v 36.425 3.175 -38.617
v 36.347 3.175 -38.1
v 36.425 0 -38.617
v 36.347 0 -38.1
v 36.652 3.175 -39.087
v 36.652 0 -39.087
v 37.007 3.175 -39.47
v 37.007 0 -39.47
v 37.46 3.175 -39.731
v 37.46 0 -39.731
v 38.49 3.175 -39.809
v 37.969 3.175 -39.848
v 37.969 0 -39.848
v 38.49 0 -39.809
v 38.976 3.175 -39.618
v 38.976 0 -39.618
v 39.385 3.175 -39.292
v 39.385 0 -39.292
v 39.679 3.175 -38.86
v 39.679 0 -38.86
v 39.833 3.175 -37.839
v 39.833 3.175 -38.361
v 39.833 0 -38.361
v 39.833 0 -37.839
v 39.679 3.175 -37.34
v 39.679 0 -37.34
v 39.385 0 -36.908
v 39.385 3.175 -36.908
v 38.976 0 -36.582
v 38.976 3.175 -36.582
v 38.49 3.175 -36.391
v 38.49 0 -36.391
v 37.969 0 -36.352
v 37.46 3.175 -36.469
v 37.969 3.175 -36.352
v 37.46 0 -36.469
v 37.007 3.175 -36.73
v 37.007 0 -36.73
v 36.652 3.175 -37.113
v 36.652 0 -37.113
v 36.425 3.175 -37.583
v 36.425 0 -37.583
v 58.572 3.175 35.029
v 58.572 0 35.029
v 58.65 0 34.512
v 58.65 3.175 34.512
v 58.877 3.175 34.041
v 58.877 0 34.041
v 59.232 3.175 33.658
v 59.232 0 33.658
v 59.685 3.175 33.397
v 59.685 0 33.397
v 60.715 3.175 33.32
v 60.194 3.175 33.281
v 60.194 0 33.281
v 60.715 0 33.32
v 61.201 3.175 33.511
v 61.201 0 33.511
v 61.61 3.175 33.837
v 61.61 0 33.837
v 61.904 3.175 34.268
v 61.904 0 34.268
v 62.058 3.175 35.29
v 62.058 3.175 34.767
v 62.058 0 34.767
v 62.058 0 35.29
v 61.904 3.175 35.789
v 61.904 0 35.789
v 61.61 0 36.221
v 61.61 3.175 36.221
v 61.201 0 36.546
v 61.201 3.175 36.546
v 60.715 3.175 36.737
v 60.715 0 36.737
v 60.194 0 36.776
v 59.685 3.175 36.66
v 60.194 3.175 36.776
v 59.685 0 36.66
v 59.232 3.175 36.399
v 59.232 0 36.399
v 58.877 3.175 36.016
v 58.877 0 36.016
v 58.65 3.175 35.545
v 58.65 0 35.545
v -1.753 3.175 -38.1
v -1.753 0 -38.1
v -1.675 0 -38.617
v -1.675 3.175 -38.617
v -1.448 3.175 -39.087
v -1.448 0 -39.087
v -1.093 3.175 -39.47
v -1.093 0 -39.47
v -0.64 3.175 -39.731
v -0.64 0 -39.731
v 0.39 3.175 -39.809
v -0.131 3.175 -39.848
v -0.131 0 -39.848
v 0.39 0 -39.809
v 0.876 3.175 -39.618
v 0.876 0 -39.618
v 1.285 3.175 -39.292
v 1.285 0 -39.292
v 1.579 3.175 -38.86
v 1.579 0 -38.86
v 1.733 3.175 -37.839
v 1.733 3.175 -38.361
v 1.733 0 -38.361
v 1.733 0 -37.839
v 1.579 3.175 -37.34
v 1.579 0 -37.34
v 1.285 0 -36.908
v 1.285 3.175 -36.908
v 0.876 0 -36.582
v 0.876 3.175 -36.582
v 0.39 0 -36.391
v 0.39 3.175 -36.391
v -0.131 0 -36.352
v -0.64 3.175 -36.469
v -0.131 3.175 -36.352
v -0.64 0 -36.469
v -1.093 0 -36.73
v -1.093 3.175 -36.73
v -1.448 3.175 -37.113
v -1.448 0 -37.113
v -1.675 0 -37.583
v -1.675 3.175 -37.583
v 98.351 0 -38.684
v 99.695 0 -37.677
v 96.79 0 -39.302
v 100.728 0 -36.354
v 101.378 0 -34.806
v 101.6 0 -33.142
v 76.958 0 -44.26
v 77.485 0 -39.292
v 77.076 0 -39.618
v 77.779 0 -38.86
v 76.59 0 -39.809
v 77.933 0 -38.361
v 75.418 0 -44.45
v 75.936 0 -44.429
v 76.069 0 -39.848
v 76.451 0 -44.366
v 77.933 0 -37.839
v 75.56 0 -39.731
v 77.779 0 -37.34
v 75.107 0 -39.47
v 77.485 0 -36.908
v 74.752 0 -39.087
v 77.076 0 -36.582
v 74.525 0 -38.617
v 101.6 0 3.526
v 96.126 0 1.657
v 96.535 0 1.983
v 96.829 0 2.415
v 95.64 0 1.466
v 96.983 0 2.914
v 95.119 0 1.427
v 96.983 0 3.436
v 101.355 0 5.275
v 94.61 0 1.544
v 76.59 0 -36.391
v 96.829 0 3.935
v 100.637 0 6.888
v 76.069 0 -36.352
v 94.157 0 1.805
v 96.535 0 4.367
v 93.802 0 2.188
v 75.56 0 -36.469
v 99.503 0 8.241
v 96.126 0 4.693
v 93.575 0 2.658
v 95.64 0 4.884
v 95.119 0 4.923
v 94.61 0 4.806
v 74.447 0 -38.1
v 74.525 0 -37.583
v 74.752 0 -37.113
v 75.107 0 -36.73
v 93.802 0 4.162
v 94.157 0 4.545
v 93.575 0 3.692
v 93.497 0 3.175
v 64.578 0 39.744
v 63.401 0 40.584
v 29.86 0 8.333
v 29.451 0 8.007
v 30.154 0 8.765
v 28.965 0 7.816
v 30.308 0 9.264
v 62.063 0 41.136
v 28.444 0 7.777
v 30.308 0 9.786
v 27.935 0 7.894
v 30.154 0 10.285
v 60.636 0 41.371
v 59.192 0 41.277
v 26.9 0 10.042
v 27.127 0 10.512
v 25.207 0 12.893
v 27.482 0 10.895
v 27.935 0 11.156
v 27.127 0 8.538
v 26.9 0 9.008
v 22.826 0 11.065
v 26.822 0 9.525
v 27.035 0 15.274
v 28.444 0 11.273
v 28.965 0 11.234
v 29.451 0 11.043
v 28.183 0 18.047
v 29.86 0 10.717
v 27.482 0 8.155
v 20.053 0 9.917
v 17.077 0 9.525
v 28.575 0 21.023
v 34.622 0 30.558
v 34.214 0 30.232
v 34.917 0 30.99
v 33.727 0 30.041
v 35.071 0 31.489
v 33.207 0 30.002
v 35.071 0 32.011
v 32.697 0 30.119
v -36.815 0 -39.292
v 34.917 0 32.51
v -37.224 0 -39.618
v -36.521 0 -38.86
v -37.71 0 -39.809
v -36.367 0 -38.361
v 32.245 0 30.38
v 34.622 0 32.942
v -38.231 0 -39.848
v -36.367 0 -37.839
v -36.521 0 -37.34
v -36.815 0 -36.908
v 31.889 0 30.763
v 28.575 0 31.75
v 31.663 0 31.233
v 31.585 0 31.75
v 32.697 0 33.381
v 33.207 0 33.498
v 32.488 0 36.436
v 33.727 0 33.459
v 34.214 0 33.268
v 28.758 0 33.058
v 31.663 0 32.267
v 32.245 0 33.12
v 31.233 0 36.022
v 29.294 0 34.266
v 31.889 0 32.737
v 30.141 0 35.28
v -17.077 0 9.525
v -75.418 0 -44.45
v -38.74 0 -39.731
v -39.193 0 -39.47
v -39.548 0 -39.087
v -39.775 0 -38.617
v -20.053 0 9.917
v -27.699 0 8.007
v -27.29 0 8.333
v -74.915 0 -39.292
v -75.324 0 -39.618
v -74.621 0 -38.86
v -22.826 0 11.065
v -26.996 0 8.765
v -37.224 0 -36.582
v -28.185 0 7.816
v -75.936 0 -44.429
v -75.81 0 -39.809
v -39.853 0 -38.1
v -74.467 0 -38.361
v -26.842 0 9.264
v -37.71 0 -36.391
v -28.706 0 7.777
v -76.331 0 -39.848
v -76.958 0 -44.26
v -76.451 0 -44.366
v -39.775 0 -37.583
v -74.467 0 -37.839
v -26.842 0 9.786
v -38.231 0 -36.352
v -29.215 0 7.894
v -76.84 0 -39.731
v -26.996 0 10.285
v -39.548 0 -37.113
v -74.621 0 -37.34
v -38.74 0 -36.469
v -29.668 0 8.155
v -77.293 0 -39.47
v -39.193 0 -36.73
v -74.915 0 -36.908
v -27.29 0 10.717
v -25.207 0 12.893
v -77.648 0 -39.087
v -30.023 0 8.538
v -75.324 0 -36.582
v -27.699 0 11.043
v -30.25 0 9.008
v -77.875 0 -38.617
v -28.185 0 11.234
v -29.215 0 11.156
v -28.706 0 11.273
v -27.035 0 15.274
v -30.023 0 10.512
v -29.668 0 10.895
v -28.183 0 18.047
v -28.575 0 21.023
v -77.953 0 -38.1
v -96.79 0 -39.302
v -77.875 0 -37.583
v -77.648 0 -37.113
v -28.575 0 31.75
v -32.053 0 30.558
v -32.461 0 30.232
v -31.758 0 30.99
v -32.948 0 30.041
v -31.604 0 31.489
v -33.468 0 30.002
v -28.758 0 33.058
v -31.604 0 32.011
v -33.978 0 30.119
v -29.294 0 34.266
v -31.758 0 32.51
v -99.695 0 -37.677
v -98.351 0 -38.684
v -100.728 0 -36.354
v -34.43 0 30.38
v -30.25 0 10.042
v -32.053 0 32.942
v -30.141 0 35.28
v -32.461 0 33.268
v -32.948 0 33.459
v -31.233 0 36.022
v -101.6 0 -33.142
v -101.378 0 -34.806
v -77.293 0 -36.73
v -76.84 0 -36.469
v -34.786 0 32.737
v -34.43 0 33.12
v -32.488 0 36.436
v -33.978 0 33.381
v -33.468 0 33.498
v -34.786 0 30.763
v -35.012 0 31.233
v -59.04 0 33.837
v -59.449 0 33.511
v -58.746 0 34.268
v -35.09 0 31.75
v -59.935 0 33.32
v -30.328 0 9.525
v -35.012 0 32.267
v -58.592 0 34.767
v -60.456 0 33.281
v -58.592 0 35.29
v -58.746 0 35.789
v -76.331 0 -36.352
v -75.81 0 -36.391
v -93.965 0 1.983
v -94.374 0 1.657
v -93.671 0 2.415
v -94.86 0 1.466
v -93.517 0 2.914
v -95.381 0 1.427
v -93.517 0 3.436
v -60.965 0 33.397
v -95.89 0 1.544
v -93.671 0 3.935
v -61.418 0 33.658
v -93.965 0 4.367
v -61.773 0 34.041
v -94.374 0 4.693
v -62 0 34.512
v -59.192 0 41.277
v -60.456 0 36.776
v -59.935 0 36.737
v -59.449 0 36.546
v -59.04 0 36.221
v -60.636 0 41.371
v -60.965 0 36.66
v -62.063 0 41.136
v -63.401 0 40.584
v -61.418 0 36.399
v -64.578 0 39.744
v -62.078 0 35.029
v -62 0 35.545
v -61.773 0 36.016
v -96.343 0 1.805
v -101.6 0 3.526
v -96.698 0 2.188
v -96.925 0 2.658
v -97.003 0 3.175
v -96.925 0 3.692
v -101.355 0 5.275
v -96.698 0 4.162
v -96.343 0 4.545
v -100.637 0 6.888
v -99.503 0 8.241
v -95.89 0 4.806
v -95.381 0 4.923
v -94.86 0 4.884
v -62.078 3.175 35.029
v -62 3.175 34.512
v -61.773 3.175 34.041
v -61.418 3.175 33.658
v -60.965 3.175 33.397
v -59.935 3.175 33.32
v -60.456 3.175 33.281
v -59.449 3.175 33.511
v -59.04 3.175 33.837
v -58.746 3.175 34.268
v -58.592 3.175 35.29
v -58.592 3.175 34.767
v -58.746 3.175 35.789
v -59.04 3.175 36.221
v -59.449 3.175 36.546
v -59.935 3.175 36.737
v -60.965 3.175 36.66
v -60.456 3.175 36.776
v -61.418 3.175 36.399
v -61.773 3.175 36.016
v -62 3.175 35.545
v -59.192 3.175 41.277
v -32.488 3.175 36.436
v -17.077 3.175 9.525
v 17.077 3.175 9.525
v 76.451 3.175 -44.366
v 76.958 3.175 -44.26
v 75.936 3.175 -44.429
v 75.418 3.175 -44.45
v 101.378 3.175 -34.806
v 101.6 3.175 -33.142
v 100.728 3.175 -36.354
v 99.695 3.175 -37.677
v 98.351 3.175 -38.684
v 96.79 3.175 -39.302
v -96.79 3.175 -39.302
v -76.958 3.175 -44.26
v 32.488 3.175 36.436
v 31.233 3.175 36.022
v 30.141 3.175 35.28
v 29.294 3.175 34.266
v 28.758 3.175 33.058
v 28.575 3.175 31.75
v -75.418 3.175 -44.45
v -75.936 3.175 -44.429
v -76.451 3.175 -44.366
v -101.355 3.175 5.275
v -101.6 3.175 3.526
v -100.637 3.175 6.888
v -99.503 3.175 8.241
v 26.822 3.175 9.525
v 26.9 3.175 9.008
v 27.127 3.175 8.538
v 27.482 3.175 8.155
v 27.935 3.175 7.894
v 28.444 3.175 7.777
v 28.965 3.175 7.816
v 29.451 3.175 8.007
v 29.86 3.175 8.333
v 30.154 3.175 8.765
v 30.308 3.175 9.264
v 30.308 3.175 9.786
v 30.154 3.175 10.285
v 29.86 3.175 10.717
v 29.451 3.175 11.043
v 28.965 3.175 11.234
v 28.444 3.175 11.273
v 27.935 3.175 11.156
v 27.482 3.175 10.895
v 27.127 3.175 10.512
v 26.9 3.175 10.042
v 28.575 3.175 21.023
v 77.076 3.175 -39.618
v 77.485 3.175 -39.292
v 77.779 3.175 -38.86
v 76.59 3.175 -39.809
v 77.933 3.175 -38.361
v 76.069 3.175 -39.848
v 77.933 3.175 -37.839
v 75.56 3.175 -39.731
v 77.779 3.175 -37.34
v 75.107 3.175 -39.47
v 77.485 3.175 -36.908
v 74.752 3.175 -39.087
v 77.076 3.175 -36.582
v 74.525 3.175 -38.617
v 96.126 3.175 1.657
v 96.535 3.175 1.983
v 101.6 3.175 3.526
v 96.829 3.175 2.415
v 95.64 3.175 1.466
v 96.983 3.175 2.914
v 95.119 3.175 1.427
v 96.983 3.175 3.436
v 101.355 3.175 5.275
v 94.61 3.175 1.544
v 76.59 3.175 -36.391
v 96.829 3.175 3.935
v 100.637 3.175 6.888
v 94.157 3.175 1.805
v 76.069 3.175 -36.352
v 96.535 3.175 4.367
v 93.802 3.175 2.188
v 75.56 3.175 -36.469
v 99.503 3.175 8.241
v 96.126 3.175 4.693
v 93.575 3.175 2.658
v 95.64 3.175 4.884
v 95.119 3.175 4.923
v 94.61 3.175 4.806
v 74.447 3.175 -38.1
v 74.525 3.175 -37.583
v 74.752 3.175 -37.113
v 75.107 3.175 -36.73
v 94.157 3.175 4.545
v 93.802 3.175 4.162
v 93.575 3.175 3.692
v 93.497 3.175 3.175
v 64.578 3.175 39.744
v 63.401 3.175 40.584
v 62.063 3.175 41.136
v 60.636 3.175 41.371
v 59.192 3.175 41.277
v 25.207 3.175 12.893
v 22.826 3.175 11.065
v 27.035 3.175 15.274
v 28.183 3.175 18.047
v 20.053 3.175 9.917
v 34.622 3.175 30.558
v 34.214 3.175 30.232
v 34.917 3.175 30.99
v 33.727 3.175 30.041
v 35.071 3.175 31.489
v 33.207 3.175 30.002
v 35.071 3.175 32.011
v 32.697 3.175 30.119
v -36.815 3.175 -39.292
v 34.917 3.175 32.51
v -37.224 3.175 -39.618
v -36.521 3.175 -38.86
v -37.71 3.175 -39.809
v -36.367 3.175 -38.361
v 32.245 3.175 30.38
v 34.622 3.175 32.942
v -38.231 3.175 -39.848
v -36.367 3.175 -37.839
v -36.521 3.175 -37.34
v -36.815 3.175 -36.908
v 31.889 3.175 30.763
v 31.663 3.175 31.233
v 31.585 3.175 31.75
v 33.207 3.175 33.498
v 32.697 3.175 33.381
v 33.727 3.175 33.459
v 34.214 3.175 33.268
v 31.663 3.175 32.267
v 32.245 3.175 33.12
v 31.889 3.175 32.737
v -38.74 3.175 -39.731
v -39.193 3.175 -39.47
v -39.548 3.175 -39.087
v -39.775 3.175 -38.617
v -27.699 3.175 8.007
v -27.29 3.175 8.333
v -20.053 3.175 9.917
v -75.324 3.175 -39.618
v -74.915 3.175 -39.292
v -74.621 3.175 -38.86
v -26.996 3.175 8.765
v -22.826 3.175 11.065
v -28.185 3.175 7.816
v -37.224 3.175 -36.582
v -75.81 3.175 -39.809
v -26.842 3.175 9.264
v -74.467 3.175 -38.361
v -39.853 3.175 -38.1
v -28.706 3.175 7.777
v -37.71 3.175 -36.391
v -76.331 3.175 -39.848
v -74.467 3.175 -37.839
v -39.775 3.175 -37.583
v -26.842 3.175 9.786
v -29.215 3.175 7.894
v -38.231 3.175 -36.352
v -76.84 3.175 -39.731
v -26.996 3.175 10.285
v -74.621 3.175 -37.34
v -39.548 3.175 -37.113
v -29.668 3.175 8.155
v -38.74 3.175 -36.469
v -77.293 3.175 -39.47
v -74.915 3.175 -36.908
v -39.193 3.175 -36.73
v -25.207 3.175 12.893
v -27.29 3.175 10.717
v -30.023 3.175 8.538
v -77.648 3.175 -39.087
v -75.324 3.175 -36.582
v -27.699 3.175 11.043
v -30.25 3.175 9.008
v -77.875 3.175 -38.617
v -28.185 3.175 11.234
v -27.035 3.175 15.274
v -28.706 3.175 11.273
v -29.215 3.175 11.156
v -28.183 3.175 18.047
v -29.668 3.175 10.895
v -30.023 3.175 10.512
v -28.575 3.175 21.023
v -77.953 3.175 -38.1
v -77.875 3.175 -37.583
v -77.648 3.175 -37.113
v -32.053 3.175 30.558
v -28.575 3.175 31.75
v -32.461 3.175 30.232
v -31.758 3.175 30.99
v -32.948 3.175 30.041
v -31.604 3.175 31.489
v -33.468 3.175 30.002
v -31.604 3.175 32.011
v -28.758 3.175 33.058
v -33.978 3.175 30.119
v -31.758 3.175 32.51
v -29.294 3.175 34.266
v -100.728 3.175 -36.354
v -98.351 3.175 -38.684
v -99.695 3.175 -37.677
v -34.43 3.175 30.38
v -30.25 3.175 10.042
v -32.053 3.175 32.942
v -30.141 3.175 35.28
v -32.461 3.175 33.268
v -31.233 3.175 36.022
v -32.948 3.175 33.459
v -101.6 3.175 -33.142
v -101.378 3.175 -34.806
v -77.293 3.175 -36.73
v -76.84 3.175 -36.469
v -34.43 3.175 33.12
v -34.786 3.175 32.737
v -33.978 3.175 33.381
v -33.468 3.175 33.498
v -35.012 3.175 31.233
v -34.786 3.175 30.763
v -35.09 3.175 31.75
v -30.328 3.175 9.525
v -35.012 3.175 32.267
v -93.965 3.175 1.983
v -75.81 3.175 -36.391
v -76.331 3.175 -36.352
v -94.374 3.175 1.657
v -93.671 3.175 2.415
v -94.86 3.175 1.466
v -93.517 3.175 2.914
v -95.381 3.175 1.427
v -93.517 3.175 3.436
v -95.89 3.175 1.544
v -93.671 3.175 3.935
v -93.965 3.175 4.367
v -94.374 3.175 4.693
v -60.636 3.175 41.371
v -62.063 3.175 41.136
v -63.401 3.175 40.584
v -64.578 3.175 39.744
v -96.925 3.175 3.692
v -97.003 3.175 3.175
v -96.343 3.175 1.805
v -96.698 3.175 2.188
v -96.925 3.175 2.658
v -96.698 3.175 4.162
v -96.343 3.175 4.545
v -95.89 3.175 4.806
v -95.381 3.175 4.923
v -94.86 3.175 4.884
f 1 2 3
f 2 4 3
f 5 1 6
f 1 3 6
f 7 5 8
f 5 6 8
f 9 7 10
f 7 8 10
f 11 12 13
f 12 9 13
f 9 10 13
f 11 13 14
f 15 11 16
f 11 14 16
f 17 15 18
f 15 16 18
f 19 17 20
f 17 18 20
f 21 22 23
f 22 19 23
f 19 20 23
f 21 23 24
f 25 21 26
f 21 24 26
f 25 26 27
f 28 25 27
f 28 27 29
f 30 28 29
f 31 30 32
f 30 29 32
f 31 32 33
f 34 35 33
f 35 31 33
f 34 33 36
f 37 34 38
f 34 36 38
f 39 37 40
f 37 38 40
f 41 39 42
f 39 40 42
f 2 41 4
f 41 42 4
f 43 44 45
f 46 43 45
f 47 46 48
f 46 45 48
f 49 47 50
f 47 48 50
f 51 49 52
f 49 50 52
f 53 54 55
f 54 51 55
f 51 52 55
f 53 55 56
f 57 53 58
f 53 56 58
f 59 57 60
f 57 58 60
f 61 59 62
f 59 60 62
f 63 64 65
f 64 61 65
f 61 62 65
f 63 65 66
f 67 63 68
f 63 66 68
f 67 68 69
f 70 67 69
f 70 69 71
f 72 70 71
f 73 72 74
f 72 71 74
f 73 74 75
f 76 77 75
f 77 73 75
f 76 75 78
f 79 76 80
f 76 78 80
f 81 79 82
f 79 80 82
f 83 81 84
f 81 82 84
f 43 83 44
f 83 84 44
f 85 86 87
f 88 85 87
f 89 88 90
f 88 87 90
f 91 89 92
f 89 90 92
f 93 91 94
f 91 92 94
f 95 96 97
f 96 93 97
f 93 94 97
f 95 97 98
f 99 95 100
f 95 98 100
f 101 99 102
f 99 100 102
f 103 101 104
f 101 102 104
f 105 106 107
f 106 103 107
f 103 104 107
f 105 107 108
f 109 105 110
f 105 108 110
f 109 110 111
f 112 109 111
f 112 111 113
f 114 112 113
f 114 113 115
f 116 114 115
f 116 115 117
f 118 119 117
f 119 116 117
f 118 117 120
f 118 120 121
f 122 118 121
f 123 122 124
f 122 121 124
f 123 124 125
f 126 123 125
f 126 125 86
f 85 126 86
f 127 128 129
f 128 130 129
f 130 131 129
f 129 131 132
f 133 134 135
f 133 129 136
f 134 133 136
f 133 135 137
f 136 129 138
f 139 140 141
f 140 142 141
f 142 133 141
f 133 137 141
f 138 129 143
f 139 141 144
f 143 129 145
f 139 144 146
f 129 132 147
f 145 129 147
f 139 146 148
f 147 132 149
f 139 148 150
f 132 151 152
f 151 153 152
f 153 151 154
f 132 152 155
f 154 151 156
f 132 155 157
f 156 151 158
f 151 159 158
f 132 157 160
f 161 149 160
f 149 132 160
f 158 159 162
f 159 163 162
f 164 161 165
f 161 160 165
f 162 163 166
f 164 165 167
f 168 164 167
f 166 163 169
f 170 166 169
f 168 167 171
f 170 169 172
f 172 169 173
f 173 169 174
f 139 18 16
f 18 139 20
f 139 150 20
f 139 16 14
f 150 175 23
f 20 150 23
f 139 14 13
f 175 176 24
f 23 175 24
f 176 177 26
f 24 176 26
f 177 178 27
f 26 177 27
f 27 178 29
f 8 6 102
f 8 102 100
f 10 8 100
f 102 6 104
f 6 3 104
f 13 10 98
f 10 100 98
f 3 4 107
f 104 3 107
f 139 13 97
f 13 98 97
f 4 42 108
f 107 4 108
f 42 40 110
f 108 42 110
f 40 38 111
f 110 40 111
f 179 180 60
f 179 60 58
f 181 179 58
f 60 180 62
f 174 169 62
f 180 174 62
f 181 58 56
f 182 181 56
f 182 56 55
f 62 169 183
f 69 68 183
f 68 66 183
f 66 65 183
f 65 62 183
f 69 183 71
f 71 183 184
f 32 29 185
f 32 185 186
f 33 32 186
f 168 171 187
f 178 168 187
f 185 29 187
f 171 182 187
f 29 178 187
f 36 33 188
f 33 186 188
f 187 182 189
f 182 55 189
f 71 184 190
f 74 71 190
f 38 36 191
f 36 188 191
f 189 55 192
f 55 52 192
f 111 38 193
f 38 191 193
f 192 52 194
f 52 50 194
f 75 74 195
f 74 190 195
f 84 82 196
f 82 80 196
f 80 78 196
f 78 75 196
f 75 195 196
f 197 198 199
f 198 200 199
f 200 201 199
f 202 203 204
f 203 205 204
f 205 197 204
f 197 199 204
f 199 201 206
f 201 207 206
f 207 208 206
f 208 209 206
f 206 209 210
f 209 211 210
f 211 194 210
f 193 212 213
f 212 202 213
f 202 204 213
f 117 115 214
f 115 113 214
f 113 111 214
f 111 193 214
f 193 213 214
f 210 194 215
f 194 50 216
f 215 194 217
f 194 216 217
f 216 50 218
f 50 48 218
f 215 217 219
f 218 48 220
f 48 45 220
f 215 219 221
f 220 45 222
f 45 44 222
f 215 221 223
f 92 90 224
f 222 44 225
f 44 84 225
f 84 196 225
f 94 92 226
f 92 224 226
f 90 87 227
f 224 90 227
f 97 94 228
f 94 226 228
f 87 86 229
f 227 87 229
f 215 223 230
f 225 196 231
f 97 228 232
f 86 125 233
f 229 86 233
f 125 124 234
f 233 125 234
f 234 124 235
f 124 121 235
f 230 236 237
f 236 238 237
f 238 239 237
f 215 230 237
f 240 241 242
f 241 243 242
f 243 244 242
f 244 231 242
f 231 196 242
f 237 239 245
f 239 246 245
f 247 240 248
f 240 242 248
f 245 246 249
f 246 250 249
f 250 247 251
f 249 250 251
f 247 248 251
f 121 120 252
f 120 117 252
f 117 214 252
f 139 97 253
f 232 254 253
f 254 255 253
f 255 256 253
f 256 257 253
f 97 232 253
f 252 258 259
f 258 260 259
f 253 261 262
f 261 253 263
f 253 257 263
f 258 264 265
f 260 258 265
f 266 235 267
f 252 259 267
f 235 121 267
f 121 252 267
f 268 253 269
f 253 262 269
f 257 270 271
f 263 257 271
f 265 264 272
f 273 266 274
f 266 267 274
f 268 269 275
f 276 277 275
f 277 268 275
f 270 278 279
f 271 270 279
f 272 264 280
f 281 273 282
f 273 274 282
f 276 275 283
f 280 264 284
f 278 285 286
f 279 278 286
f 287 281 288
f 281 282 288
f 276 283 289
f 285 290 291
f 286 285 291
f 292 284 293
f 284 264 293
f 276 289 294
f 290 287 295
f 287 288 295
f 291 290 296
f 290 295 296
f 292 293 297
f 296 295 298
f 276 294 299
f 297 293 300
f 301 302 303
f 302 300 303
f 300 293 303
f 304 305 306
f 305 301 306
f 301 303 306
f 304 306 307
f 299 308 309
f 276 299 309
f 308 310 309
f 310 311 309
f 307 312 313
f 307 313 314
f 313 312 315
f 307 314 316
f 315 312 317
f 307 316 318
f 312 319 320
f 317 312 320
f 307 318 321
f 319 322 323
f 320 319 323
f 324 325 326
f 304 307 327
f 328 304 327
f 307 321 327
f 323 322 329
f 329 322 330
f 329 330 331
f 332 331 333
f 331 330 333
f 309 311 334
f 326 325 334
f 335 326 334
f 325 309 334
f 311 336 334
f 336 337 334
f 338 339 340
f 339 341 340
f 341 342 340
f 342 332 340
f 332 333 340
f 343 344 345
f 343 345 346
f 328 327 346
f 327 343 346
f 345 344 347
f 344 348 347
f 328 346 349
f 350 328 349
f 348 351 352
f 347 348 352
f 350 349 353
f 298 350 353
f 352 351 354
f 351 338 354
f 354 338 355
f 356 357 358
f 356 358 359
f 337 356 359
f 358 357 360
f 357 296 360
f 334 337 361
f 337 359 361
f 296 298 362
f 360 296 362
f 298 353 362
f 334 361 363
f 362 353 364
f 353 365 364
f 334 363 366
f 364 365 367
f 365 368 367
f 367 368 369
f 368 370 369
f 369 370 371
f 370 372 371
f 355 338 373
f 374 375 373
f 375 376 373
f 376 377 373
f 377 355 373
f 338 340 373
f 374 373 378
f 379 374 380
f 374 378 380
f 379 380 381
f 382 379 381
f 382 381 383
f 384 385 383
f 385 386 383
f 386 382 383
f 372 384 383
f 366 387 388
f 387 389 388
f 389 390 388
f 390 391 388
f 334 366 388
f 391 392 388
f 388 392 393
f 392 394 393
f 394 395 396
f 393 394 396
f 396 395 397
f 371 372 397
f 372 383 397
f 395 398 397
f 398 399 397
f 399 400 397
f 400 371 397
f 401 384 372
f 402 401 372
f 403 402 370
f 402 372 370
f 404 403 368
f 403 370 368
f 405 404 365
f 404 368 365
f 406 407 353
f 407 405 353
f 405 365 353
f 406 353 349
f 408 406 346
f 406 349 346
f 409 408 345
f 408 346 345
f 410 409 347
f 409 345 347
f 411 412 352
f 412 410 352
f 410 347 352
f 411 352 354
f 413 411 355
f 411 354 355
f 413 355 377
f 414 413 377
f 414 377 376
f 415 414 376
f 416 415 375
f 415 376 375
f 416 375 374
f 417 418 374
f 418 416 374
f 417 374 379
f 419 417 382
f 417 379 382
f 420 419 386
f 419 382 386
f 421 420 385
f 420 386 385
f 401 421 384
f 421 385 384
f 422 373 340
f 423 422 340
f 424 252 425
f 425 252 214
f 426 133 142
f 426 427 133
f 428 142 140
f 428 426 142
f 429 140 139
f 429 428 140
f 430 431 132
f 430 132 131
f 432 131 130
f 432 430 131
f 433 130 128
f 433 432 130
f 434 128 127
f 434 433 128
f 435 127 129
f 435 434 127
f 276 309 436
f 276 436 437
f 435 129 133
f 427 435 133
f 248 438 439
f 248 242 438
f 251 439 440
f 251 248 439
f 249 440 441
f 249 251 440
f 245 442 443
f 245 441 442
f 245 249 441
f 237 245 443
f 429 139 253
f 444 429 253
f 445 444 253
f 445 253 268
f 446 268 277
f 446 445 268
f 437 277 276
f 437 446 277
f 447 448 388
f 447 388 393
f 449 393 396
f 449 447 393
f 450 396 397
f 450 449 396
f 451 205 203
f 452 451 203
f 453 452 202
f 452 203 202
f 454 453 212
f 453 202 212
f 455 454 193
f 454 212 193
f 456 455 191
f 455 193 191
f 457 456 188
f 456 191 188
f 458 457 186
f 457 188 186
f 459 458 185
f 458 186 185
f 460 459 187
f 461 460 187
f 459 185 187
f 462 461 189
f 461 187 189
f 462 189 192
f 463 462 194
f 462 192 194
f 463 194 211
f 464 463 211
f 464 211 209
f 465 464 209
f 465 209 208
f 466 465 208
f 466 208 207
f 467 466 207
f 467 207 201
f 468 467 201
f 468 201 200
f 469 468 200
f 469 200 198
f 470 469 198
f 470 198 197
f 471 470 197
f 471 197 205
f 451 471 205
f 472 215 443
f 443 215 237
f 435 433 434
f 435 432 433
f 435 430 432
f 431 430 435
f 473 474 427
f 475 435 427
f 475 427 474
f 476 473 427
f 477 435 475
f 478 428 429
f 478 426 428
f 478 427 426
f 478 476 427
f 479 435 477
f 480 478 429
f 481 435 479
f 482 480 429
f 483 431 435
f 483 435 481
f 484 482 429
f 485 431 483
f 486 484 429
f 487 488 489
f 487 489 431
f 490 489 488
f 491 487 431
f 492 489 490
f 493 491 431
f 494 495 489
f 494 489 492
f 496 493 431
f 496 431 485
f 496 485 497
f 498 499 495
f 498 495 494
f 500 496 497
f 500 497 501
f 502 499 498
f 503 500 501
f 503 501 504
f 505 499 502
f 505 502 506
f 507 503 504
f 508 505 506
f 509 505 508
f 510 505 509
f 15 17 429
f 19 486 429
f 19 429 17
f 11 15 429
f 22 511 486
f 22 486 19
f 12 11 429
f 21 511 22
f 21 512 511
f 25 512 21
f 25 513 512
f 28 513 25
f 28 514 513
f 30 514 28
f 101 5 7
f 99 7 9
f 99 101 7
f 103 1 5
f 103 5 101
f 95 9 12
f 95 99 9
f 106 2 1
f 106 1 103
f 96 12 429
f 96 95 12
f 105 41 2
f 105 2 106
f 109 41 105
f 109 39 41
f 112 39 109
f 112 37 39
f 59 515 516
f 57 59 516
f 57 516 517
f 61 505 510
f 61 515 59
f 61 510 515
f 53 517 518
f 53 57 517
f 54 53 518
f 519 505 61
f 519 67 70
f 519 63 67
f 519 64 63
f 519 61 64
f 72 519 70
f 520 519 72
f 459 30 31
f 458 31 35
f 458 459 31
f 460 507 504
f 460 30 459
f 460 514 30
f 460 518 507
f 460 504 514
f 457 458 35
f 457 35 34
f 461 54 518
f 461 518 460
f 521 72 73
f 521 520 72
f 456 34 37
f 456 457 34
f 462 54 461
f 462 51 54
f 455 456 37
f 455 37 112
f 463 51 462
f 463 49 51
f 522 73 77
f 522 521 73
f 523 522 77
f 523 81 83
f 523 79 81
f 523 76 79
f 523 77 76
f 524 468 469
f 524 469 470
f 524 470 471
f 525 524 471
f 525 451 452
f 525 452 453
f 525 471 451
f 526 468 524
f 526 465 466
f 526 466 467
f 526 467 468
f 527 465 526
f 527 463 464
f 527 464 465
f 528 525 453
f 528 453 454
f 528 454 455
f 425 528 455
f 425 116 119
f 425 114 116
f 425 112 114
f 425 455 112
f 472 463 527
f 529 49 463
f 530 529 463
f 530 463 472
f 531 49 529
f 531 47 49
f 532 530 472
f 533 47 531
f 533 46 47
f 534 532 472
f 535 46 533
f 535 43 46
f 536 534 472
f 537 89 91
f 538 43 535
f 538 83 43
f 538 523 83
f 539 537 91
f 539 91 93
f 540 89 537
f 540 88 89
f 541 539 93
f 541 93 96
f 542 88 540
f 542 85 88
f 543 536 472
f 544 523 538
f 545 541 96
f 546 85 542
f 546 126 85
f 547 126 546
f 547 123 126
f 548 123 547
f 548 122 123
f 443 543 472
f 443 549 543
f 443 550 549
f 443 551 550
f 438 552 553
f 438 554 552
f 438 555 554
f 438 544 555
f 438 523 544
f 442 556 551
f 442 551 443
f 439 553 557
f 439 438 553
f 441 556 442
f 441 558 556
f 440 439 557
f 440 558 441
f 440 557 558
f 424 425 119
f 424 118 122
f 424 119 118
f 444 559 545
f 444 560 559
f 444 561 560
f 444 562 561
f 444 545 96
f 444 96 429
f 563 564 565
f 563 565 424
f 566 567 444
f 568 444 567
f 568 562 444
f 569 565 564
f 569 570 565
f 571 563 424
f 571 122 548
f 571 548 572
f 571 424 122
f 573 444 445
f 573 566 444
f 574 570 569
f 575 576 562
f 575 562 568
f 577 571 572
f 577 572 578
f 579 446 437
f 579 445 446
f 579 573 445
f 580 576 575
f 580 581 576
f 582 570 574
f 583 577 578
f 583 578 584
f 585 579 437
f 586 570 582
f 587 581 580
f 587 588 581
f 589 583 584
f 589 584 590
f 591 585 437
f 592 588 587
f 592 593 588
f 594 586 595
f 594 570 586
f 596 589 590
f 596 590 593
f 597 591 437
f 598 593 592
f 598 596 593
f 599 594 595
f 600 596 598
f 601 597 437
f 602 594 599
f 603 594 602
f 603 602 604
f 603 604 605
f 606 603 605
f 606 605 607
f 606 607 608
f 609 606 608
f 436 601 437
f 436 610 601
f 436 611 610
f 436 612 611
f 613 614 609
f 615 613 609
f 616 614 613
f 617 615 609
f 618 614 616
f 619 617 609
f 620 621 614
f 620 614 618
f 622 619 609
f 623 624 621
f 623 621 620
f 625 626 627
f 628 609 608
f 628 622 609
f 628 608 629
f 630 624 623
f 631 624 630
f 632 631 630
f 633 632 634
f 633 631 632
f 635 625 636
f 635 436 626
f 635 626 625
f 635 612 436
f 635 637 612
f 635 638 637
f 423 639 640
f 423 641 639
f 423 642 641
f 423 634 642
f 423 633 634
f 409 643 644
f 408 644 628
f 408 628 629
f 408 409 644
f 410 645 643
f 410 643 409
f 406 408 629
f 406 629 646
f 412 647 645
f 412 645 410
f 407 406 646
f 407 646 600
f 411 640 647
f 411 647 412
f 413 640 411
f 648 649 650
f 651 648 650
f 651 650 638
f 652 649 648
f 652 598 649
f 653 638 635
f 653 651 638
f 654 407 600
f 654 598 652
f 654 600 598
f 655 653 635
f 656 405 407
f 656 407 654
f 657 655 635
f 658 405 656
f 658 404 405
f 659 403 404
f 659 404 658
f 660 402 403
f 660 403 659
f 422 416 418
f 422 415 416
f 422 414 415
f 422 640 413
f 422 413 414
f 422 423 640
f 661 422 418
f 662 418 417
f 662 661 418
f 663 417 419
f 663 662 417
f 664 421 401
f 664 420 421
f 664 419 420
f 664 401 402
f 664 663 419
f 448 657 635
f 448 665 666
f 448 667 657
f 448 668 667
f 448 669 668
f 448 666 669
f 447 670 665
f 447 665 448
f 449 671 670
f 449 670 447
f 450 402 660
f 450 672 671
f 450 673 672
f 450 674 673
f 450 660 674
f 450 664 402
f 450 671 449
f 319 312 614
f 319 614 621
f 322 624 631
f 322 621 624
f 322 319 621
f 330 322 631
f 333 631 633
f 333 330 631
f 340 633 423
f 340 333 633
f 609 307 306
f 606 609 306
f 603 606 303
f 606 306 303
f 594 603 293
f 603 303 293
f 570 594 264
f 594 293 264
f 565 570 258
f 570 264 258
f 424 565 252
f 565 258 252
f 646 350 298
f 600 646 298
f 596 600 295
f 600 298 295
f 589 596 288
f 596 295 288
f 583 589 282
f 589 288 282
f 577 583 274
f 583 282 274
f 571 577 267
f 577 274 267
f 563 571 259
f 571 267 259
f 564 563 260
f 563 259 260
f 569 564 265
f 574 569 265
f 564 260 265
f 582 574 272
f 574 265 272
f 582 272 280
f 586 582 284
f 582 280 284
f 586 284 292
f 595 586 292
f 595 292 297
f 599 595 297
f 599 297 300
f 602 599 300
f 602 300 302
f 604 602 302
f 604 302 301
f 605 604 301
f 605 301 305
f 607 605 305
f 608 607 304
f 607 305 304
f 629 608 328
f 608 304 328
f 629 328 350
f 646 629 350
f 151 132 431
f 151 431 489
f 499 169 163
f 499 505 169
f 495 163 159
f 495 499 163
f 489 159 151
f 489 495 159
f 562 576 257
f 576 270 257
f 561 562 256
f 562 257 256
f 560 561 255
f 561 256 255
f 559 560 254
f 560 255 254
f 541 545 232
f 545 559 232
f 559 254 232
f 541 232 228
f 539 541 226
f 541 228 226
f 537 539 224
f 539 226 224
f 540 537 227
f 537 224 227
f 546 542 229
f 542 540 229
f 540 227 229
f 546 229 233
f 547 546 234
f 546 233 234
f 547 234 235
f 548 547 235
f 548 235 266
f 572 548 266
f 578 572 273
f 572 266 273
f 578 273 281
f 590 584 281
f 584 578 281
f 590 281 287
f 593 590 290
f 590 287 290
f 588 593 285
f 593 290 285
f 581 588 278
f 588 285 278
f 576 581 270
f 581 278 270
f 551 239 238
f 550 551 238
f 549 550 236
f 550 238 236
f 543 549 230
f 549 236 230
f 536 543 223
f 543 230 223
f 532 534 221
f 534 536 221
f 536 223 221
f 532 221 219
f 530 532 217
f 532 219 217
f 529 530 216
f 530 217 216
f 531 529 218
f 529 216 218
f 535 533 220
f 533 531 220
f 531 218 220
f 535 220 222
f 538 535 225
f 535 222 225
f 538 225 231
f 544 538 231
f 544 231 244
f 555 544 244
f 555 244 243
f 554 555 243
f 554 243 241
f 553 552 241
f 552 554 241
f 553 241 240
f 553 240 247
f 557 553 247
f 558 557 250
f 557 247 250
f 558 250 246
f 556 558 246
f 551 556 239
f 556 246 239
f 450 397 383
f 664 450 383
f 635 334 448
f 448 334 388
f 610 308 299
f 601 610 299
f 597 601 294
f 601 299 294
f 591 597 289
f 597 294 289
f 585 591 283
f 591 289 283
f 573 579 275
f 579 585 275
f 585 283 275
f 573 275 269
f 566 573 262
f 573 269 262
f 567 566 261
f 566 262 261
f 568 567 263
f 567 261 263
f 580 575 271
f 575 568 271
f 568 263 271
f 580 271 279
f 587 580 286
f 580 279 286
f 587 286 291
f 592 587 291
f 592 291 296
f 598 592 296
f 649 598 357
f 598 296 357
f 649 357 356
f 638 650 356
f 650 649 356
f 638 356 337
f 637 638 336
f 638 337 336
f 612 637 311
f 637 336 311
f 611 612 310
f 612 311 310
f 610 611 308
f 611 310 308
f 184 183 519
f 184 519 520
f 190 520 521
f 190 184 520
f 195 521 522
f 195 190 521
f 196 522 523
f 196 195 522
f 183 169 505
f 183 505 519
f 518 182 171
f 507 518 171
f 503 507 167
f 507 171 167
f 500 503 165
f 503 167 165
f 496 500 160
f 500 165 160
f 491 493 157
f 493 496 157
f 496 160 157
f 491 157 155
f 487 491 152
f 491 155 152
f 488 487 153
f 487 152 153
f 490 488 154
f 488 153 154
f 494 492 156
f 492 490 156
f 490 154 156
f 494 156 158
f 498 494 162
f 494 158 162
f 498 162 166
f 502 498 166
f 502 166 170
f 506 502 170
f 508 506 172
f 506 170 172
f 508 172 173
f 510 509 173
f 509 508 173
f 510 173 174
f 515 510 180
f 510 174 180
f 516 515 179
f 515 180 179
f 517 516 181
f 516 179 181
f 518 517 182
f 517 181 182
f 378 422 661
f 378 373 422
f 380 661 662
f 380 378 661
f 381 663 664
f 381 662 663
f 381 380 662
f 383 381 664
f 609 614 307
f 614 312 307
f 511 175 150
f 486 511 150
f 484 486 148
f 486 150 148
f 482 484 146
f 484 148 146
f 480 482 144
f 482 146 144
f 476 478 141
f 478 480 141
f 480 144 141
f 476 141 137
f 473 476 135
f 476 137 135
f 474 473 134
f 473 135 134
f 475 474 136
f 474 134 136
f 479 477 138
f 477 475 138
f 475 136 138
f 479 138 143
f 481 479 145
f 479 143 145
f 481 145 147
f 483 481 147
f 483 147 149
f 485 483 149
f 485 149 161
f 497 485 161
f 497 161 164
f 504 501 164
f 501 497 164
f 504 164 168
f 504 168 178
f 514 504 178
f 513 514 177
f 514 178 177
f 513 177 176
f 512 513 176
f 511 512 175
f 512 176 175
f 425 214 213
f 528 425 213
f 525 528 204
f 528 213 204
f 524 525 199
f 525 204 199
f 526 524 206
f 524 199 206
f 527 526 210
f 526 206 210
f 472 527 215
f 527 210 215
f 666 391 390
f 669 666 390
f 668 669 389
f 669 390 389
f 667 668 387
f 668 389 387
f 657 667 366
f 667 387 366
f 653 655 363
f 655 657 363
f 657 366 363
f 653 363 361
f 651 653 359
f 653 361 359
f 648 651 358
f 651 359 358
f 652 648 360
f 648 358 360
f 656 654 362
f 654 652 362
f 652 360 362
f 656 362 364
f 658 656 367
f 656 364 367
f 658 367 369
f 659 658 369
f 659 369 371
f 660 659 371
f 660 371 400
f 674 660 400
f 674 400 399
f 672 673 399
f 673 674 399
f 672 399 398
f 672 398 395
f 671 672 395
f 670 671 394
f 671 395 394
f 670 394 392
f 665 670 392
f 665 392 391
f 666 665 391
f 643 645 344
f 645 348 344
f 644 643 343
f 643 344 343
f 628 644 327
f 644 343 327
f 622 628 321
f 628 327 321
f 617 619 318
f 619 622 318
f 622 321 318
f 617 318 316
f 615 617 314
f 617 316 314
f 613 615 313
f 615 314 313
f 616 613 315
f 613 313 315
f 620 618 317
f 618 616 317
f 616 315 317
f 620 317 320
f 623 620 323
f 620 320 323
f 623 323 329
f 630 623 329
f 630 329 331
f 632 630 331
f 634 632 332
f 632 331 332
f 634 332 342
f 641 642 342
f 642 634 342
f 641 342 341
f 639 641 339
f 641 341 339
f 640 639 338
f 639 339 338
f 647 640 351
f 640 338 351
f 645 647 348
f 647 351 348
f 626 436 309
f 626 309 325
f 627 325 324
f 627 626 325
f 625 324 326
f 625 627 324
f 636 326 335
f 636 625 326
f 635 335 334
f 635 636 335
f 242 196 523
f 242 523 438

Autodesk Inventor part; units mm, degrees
ref_plane "YZ Plane" through (0, 0, 0) normal (1, 0, 0) x (0, 1, 0)
ref_plane "XZ Plane" through (0, 0, 0) normal (0, 1, 0) x (-1, 0, 0)
ref_plane "XY Plane" through (0, 0, 0) normal (0, 0, 1) x (1, 0, 0)
sketch "Sketch1" plane through (0, 0, 0) normal (0, 1, 0) x (-1, 0, 0)
  line L0 (101.6, 38.1) -> (-101.6, 38.1) construction
  line L1 (-101.6, 38.1) -> (-101.6, -38.1) construction
  line L2 (-101.6, -38.1) -> (101.6, -38.1) construction
  line L3 (101.6, -38.1) -> (101.6, 38.1) construction
  line L4 (101.6, 38.1) -> (-101.6, -38.1) construction
  line L5 (-101.6, 38.1) -> (101.6, -38.1) construction
  line L6 (-28.575, 66.675) -> (28.575, 66.675) construction
  line L7 (28.575, 66.675) -> (28.575, 9.525)
  line L8 (28.575, 9.525) -> (-28.575, 9.525)
  line L9 (-28.575, 9.525) -> (-28.575, 66.675)
  line L10 (-28.575, 66.675) -> (28.575, 9.525) construction
  line L11 (28.575, 66.675) -> (-28.575, 9.525) construction
  circle A0 centre (-38.1, 50.8) radius 3.175
  line L12 (0, 38.1) -> (0, -38.1) construction
  circle A1 centre (-38.1, 50.8) radius 9.525
  line L13 (-38.1, 60.325) -> (-28.575, 60.325)
  circle A2 centre (38.1, 50.8) radius 3.175
  circle A3 centre (38.1, 50.8) radius 9.525
  line L14 (38.1, 60.325) -> (28.575, 60.325)
  circle A4 centre (-76.2, -38.1) radius 1.7526
  circle A5 centre (-95.25, 3.175) radius 1.7526
  circle A6 centre (76.2, -38.1) radius 1.7526
  circle A7 centre (95.25, 3.175) radius 1.7526
  line L15 (-101.6, -38.1) -> (-101.6, 6.35)
  line L16 (-101.6, 6.35) -> (-44.4797, 57.8728)
  line L17 (101.6, -38.1) -> (101.6, 6.35)
  line L18 (101.6, 6.35) -> (44.4797, 57.8728)
  line L19 (-42.6417, 42.4275) -> (-87.975, 1.5367)
  line L20 (-87.975, 1.5367) -> (-87.975, -38.1)
  line L21 (87.975, -38.1) -> (87.975, 1.5367)
  line L22 (87.975, 1.5367) -> (42.6417, 42.4275)
  line L23 (0, -38.1) -> (-95.25, -38.1) construction
  line L24 (0, -38.1) -> (95.25, -38.1) construction
  circle A8 centre (-60.325, 35.0287) radius 1.7526
  circle A9 centre (-33.3375, 31.75) radius 1.7526
  line L25 (-38.1, 0) -> (-38.1, 41.275)
  line L26 (-38.1, 0) -> (0, 0) construction
  circle A10 centre (60.325, 35.0287) radius 1.7526
  circle A11 centre (33.3375, 31.75) radius 1.7526
  line L27 (38.1, 0) -> (38.1, 41.275)
  line L28 (38.1, 0) -> (0, 0) construction
  line L29 (-87.975, 0) -> (-65.115, 0)
  line L30 (-65.115, 0) -> (-65.115, -31.75)
  line L31 (-65.115, -31.75) -> (-87.975, -31.75)
  line L32 (-101.6, -38.1) -> (101.6, -38.1) construction
  line L33 (101.6, -38.1) -> (101.6, 19.05)
  line L34 (101.6, 19.05) -> (-101.6, 19.05) construction
  line L35 (-101.6, 19.05) -> (-101.6, -38.1)
  line L36 (-101.6, 19.05) -> (-87.5203, 19.05) construction
  line L37 (87.5203, 19.05) -> (101.6, 19.05) construction
  circle A12 centre (-38.1, 0) radius 3.175 construction
  circle A13 centre (-38.1, 0) radius 6.35 construction
  circle A14 centre (38.1, 0) radius 3.175 construction
  circle A15 centre (38.1, 0) radius 6.35 construction
  circle A16 centre (28.575, 9.525) radius 1.7526
  circle A17 centre (28.575, 9.525) radius 4.7625
  arc A18 (17.0773, 9.525) -> (28.575, 21.0227) centre (17.0773, 21.0227) ccw
  circle A19 centre (-28.575, 9.525) radius 1.7526
  circle A20 centre (-28.575, 9.525) radius 4.7625
  arc A21 (-28.575, 21.0227) -> (-17.0773, 9.525) centre (-17.0773, 21.0227) ccw
  arc A22 (31.4325, 5.715) -> (38.1, 19.05) centre (21.4312, 19.05) ccw
  arc A23 (-38.1, 19.05) -> (-31.4325, 5.715) centre (-21.4312, 19.05) ccw
  line L38 (-61.94, -38.1) -> (-61.94, 25.0204)
  line L39 (87.975, 0) -> (65.115, 0)
  line L40 (65.115, 0) -> (65.115, -31.75)
  line L41 (65.115, -31.75) -> (87.975, -31.75)
  line L42 (61.94, -38.1) -> (61.94, 25.0204)
  line L43 (-28.575, 4.7625) -> (28.575, 4.7625)
  line L44 (101.6, -31.75) -> (-101.6, -31.75)
  line L45 (-101.6, -31.75) -> (-101.6, -44.45) construction
  line L46 (-101.6, -44.45) -> (101.6, -44.45)
  line L47 (101.6, -44.45) -> (101.6, -31.75) construction
  circle A24 centre (0, -38.1) radius 1.7526
  circle A25 centre (38.1, -38.1) radius 1.7526
  circle A26 centre (-38.1, -38.1) radius 1.7526
  line L48 (101.6, -38.1) -> (76.2, -44.45)
  line L49 (-101.6, -38.1) -> (-76.2, -44.45)
  line L50 (76.2, -38.1) -> (76.2, -44.45) construction
  line L51 (-76.2, -38.1) -> (-76.2, -44.45) construction
  line L52 (59.1924, 41.2769) -> (32.488, 36.4361)
  circle A27 centre (60.325, 35.0287) radius 6.35
  circle A28 centre (33.3375, 31.75) radius 4.7625
  line L53 (-59.1924, 41.2769) -> (-32.488, 36.4361)
  circle A29 centre (-60.325, 35.0287) radius 6.35
  circle A30 centre (-33.3375, 31.75) radius 4.7625
  line L54 (-87.975, 0) -> (-65.115, 0)
  line L55 (-65.115, 0) -> (-65.115, -3.175)
  line L56 (-65.115, -3.175) -> (-87.975, -3.175)
  line L57 (-87.975, -3.175) -> (-87.975, 0)
  line L58 (-65.115, -15.875) -> (-87.975, -15.875) construction
  line L59 (-65.115, -28.575) -> (-87.975, -28.575)
  line L60 (-84.8, -38.1) -> (-84.8, 0.1248)
  line L61 (65.115, -3.175) -> (87.975, -3.175)
  line L62 (65.115, -15.875) -> (87.975, -15.875) construction
  line L63 (65.115, -28.575) -> (87.975, -28.575)
  line L64 (84.8, -38.1) -> (84.8, 0.1248)
  point P0 (28.575, 38.1)
  point P1 (-28.575, 38.1)
  point P2 (28.575, 60.325)
  point P3 (44.4797, 57.8728)
  point P4 (101.6, -15.875)
  point P5 (38.1, 41.275)
  point P6 (-87.975, -31.75)
  point P7 (-101.6, 6.35)
  point P8 (101.6, 6.35)
  point P9 (31.75, 0)
  point P10 (38.1, 6.35)
  point P11 (-38.1, 6.35)
  point P12 (-31.75, 0)
  point P13 (87.975, 0)
  point P14 (61.94, 25.0204)
  point P15 (-17.0773, 9.525)
  point P16 (-28.575, 21.0227)
  point P17 (-38.1, 19.05)
  point P18 (-31.4325, 5.715)
  point P19 (-21.8502, 0)
  point P20 (21.8502, 0)
  point P21 (-25.2074, 12.8926)
  point P22 (-28.575, 14.2875)
  point P23 (-23.8125, 9.525)
  point P24 (-28.575, 50.8)
  point P25 (25.2074, 12.8926)
  point P26 (28.575, 14.2875)
  point P27 (23.8125, 9.525)
  point P28 (28.575, 50.8)
  point P29 (26.8224, 9.525)
  point P30 (28.575, 11.2776)
  point P31 (61.94, -31.75)
  point P32 (-61.94, -31.75)
  point P33 (-28.575, 31.75)
  point P34 (-64.5781, 39.7439)
  point P35 (64.5781, 39.7439)
  point P36 (28.575, 31.75)
  point P37 (-84.8, -3.175)
  point P38 (-84.8, -28.575)
  point P39 (84.8, -3.175)
  point P40 (84.8, -28.575)
  point P41 (-101.6, -31.75)
  point P42 (-56.0719, 30.3135)
  point P43 (56.0719, 30.3135)
  point P44 (46.4735, 38.9713)
  point P45 (-46.4735, 38.9713)
  point P46 (-28.575, 11.2776)
  point P47 (-26.8224, 9.525)
  dimension "d0" = 203.2
  dimension "d1" = 76.2
  dimension "d4" = 57.15
  dimension "d6" = 6.35
  dimension "d7" = 38.1
  dimension "d8" = 19.05
  dimension "d10" = 3.5052
  dimension "d11" = 3.5052
  dimension "d12" = 0
  dimension "d14" = 25.4
  dimension "d15" = 6.35
  dimension "d20" = 50.8
  dimension "d21" = 41.275
  dimension "d22" = 44.45
  dimension "d24" = 12.7
  dimension "d25" = 13.625
  dimension "d26" = 12.7
  dimension "d27" = 13.625
  dimension "d31" = 3.5052
  dimension "d32" = 3.5052
  dimension "d33" = 6.35
  dimension "d34" = 31.75
  dimension "d35" = 4.7625
  dimension "d36" = 22.225
  dimension "d37" = 9.525
  dimension "d39" = 31.75
  dimension "d40" = 6.35
  dimension "d42" = 57.15
  dimension "d43" = 6.35
  dimension "d44" = 9.525
  dimension "d45" = 9.525
  dimension "d46" = 12.7
  dimension "d104" = 3.5052
  dimension "d105" = 9.525
  dimension "d106" = 3.175
  dimension "d107" = 22.86
  dimension "d123" = 88.9
  dimension "d124" = 12.7
  dimension "d125" = 3.5052
  dimension "d126" = 3.5052
  dimension "d127" = 38.1
  dimension "d128" = 28.575
  dimension "d129" = 3.175
  dimension "d130" = 3.175
extrude "Extrusion1" add sketch "Sketch1" along normal blind 3.175 contours A28 L27 A22 A17 L7 | A28 | L7 A17 A18 | L52 L27 A28 | L27 L52 L22 L42 L44 L38 L19 L53 L25 A23 A20 L43 A17 A22 | L18 L17 L44 L21 L22 A27 | A27 | A17 L8 A16 L7 | L7 A16 L8 A17 | A17 L8 A18 | L52 A27 L22 | A17 L43 A20 L8 | L17 L48 L46 L49 L15 L44 L31 L41 | L8 A20 A21 | L22 L21 L39 L40 L44 L42 | L41 L64 L63 L21 | A20 L9 A19 L8 | L8 A19 L9 A20 | A20 L9 A21 | L63 L64 L61 L21 | L41 L40 L63 L64 | A23 L25 A30 L9 A20 | L21 L61 L64 L39 | L44 L30 L29 L20 L19 L38 | L63 L40 L61 L64 | A30 | L64 L61 L40 L39 | L19 L20 L44 L15 L16 A29 | L31 L60 L59 L30 | L25 L53 A30 | A29 L53 L19 | A29 | L59 L60 L56 L30 | L31 L20 L59 L60 | L29 L60 L56 L20 | L56 L60 L29 L30 | L59 L20 L56 L60
fillet "Fillet1" radius 6.35 6 edges at (101.6, 1.5875, -38.1) (101.6, 1.5875, 6.35) (-101.6, 1.5875, 6.35) (76.2, 1.5875, -44.45) (-76.2, 1.5875, -44.45) (-101.6, 1.5875, -38.1)
equation "\"d35\" = 0.5 * d37"
properties part number "Chassis" material "UHMW, White"
